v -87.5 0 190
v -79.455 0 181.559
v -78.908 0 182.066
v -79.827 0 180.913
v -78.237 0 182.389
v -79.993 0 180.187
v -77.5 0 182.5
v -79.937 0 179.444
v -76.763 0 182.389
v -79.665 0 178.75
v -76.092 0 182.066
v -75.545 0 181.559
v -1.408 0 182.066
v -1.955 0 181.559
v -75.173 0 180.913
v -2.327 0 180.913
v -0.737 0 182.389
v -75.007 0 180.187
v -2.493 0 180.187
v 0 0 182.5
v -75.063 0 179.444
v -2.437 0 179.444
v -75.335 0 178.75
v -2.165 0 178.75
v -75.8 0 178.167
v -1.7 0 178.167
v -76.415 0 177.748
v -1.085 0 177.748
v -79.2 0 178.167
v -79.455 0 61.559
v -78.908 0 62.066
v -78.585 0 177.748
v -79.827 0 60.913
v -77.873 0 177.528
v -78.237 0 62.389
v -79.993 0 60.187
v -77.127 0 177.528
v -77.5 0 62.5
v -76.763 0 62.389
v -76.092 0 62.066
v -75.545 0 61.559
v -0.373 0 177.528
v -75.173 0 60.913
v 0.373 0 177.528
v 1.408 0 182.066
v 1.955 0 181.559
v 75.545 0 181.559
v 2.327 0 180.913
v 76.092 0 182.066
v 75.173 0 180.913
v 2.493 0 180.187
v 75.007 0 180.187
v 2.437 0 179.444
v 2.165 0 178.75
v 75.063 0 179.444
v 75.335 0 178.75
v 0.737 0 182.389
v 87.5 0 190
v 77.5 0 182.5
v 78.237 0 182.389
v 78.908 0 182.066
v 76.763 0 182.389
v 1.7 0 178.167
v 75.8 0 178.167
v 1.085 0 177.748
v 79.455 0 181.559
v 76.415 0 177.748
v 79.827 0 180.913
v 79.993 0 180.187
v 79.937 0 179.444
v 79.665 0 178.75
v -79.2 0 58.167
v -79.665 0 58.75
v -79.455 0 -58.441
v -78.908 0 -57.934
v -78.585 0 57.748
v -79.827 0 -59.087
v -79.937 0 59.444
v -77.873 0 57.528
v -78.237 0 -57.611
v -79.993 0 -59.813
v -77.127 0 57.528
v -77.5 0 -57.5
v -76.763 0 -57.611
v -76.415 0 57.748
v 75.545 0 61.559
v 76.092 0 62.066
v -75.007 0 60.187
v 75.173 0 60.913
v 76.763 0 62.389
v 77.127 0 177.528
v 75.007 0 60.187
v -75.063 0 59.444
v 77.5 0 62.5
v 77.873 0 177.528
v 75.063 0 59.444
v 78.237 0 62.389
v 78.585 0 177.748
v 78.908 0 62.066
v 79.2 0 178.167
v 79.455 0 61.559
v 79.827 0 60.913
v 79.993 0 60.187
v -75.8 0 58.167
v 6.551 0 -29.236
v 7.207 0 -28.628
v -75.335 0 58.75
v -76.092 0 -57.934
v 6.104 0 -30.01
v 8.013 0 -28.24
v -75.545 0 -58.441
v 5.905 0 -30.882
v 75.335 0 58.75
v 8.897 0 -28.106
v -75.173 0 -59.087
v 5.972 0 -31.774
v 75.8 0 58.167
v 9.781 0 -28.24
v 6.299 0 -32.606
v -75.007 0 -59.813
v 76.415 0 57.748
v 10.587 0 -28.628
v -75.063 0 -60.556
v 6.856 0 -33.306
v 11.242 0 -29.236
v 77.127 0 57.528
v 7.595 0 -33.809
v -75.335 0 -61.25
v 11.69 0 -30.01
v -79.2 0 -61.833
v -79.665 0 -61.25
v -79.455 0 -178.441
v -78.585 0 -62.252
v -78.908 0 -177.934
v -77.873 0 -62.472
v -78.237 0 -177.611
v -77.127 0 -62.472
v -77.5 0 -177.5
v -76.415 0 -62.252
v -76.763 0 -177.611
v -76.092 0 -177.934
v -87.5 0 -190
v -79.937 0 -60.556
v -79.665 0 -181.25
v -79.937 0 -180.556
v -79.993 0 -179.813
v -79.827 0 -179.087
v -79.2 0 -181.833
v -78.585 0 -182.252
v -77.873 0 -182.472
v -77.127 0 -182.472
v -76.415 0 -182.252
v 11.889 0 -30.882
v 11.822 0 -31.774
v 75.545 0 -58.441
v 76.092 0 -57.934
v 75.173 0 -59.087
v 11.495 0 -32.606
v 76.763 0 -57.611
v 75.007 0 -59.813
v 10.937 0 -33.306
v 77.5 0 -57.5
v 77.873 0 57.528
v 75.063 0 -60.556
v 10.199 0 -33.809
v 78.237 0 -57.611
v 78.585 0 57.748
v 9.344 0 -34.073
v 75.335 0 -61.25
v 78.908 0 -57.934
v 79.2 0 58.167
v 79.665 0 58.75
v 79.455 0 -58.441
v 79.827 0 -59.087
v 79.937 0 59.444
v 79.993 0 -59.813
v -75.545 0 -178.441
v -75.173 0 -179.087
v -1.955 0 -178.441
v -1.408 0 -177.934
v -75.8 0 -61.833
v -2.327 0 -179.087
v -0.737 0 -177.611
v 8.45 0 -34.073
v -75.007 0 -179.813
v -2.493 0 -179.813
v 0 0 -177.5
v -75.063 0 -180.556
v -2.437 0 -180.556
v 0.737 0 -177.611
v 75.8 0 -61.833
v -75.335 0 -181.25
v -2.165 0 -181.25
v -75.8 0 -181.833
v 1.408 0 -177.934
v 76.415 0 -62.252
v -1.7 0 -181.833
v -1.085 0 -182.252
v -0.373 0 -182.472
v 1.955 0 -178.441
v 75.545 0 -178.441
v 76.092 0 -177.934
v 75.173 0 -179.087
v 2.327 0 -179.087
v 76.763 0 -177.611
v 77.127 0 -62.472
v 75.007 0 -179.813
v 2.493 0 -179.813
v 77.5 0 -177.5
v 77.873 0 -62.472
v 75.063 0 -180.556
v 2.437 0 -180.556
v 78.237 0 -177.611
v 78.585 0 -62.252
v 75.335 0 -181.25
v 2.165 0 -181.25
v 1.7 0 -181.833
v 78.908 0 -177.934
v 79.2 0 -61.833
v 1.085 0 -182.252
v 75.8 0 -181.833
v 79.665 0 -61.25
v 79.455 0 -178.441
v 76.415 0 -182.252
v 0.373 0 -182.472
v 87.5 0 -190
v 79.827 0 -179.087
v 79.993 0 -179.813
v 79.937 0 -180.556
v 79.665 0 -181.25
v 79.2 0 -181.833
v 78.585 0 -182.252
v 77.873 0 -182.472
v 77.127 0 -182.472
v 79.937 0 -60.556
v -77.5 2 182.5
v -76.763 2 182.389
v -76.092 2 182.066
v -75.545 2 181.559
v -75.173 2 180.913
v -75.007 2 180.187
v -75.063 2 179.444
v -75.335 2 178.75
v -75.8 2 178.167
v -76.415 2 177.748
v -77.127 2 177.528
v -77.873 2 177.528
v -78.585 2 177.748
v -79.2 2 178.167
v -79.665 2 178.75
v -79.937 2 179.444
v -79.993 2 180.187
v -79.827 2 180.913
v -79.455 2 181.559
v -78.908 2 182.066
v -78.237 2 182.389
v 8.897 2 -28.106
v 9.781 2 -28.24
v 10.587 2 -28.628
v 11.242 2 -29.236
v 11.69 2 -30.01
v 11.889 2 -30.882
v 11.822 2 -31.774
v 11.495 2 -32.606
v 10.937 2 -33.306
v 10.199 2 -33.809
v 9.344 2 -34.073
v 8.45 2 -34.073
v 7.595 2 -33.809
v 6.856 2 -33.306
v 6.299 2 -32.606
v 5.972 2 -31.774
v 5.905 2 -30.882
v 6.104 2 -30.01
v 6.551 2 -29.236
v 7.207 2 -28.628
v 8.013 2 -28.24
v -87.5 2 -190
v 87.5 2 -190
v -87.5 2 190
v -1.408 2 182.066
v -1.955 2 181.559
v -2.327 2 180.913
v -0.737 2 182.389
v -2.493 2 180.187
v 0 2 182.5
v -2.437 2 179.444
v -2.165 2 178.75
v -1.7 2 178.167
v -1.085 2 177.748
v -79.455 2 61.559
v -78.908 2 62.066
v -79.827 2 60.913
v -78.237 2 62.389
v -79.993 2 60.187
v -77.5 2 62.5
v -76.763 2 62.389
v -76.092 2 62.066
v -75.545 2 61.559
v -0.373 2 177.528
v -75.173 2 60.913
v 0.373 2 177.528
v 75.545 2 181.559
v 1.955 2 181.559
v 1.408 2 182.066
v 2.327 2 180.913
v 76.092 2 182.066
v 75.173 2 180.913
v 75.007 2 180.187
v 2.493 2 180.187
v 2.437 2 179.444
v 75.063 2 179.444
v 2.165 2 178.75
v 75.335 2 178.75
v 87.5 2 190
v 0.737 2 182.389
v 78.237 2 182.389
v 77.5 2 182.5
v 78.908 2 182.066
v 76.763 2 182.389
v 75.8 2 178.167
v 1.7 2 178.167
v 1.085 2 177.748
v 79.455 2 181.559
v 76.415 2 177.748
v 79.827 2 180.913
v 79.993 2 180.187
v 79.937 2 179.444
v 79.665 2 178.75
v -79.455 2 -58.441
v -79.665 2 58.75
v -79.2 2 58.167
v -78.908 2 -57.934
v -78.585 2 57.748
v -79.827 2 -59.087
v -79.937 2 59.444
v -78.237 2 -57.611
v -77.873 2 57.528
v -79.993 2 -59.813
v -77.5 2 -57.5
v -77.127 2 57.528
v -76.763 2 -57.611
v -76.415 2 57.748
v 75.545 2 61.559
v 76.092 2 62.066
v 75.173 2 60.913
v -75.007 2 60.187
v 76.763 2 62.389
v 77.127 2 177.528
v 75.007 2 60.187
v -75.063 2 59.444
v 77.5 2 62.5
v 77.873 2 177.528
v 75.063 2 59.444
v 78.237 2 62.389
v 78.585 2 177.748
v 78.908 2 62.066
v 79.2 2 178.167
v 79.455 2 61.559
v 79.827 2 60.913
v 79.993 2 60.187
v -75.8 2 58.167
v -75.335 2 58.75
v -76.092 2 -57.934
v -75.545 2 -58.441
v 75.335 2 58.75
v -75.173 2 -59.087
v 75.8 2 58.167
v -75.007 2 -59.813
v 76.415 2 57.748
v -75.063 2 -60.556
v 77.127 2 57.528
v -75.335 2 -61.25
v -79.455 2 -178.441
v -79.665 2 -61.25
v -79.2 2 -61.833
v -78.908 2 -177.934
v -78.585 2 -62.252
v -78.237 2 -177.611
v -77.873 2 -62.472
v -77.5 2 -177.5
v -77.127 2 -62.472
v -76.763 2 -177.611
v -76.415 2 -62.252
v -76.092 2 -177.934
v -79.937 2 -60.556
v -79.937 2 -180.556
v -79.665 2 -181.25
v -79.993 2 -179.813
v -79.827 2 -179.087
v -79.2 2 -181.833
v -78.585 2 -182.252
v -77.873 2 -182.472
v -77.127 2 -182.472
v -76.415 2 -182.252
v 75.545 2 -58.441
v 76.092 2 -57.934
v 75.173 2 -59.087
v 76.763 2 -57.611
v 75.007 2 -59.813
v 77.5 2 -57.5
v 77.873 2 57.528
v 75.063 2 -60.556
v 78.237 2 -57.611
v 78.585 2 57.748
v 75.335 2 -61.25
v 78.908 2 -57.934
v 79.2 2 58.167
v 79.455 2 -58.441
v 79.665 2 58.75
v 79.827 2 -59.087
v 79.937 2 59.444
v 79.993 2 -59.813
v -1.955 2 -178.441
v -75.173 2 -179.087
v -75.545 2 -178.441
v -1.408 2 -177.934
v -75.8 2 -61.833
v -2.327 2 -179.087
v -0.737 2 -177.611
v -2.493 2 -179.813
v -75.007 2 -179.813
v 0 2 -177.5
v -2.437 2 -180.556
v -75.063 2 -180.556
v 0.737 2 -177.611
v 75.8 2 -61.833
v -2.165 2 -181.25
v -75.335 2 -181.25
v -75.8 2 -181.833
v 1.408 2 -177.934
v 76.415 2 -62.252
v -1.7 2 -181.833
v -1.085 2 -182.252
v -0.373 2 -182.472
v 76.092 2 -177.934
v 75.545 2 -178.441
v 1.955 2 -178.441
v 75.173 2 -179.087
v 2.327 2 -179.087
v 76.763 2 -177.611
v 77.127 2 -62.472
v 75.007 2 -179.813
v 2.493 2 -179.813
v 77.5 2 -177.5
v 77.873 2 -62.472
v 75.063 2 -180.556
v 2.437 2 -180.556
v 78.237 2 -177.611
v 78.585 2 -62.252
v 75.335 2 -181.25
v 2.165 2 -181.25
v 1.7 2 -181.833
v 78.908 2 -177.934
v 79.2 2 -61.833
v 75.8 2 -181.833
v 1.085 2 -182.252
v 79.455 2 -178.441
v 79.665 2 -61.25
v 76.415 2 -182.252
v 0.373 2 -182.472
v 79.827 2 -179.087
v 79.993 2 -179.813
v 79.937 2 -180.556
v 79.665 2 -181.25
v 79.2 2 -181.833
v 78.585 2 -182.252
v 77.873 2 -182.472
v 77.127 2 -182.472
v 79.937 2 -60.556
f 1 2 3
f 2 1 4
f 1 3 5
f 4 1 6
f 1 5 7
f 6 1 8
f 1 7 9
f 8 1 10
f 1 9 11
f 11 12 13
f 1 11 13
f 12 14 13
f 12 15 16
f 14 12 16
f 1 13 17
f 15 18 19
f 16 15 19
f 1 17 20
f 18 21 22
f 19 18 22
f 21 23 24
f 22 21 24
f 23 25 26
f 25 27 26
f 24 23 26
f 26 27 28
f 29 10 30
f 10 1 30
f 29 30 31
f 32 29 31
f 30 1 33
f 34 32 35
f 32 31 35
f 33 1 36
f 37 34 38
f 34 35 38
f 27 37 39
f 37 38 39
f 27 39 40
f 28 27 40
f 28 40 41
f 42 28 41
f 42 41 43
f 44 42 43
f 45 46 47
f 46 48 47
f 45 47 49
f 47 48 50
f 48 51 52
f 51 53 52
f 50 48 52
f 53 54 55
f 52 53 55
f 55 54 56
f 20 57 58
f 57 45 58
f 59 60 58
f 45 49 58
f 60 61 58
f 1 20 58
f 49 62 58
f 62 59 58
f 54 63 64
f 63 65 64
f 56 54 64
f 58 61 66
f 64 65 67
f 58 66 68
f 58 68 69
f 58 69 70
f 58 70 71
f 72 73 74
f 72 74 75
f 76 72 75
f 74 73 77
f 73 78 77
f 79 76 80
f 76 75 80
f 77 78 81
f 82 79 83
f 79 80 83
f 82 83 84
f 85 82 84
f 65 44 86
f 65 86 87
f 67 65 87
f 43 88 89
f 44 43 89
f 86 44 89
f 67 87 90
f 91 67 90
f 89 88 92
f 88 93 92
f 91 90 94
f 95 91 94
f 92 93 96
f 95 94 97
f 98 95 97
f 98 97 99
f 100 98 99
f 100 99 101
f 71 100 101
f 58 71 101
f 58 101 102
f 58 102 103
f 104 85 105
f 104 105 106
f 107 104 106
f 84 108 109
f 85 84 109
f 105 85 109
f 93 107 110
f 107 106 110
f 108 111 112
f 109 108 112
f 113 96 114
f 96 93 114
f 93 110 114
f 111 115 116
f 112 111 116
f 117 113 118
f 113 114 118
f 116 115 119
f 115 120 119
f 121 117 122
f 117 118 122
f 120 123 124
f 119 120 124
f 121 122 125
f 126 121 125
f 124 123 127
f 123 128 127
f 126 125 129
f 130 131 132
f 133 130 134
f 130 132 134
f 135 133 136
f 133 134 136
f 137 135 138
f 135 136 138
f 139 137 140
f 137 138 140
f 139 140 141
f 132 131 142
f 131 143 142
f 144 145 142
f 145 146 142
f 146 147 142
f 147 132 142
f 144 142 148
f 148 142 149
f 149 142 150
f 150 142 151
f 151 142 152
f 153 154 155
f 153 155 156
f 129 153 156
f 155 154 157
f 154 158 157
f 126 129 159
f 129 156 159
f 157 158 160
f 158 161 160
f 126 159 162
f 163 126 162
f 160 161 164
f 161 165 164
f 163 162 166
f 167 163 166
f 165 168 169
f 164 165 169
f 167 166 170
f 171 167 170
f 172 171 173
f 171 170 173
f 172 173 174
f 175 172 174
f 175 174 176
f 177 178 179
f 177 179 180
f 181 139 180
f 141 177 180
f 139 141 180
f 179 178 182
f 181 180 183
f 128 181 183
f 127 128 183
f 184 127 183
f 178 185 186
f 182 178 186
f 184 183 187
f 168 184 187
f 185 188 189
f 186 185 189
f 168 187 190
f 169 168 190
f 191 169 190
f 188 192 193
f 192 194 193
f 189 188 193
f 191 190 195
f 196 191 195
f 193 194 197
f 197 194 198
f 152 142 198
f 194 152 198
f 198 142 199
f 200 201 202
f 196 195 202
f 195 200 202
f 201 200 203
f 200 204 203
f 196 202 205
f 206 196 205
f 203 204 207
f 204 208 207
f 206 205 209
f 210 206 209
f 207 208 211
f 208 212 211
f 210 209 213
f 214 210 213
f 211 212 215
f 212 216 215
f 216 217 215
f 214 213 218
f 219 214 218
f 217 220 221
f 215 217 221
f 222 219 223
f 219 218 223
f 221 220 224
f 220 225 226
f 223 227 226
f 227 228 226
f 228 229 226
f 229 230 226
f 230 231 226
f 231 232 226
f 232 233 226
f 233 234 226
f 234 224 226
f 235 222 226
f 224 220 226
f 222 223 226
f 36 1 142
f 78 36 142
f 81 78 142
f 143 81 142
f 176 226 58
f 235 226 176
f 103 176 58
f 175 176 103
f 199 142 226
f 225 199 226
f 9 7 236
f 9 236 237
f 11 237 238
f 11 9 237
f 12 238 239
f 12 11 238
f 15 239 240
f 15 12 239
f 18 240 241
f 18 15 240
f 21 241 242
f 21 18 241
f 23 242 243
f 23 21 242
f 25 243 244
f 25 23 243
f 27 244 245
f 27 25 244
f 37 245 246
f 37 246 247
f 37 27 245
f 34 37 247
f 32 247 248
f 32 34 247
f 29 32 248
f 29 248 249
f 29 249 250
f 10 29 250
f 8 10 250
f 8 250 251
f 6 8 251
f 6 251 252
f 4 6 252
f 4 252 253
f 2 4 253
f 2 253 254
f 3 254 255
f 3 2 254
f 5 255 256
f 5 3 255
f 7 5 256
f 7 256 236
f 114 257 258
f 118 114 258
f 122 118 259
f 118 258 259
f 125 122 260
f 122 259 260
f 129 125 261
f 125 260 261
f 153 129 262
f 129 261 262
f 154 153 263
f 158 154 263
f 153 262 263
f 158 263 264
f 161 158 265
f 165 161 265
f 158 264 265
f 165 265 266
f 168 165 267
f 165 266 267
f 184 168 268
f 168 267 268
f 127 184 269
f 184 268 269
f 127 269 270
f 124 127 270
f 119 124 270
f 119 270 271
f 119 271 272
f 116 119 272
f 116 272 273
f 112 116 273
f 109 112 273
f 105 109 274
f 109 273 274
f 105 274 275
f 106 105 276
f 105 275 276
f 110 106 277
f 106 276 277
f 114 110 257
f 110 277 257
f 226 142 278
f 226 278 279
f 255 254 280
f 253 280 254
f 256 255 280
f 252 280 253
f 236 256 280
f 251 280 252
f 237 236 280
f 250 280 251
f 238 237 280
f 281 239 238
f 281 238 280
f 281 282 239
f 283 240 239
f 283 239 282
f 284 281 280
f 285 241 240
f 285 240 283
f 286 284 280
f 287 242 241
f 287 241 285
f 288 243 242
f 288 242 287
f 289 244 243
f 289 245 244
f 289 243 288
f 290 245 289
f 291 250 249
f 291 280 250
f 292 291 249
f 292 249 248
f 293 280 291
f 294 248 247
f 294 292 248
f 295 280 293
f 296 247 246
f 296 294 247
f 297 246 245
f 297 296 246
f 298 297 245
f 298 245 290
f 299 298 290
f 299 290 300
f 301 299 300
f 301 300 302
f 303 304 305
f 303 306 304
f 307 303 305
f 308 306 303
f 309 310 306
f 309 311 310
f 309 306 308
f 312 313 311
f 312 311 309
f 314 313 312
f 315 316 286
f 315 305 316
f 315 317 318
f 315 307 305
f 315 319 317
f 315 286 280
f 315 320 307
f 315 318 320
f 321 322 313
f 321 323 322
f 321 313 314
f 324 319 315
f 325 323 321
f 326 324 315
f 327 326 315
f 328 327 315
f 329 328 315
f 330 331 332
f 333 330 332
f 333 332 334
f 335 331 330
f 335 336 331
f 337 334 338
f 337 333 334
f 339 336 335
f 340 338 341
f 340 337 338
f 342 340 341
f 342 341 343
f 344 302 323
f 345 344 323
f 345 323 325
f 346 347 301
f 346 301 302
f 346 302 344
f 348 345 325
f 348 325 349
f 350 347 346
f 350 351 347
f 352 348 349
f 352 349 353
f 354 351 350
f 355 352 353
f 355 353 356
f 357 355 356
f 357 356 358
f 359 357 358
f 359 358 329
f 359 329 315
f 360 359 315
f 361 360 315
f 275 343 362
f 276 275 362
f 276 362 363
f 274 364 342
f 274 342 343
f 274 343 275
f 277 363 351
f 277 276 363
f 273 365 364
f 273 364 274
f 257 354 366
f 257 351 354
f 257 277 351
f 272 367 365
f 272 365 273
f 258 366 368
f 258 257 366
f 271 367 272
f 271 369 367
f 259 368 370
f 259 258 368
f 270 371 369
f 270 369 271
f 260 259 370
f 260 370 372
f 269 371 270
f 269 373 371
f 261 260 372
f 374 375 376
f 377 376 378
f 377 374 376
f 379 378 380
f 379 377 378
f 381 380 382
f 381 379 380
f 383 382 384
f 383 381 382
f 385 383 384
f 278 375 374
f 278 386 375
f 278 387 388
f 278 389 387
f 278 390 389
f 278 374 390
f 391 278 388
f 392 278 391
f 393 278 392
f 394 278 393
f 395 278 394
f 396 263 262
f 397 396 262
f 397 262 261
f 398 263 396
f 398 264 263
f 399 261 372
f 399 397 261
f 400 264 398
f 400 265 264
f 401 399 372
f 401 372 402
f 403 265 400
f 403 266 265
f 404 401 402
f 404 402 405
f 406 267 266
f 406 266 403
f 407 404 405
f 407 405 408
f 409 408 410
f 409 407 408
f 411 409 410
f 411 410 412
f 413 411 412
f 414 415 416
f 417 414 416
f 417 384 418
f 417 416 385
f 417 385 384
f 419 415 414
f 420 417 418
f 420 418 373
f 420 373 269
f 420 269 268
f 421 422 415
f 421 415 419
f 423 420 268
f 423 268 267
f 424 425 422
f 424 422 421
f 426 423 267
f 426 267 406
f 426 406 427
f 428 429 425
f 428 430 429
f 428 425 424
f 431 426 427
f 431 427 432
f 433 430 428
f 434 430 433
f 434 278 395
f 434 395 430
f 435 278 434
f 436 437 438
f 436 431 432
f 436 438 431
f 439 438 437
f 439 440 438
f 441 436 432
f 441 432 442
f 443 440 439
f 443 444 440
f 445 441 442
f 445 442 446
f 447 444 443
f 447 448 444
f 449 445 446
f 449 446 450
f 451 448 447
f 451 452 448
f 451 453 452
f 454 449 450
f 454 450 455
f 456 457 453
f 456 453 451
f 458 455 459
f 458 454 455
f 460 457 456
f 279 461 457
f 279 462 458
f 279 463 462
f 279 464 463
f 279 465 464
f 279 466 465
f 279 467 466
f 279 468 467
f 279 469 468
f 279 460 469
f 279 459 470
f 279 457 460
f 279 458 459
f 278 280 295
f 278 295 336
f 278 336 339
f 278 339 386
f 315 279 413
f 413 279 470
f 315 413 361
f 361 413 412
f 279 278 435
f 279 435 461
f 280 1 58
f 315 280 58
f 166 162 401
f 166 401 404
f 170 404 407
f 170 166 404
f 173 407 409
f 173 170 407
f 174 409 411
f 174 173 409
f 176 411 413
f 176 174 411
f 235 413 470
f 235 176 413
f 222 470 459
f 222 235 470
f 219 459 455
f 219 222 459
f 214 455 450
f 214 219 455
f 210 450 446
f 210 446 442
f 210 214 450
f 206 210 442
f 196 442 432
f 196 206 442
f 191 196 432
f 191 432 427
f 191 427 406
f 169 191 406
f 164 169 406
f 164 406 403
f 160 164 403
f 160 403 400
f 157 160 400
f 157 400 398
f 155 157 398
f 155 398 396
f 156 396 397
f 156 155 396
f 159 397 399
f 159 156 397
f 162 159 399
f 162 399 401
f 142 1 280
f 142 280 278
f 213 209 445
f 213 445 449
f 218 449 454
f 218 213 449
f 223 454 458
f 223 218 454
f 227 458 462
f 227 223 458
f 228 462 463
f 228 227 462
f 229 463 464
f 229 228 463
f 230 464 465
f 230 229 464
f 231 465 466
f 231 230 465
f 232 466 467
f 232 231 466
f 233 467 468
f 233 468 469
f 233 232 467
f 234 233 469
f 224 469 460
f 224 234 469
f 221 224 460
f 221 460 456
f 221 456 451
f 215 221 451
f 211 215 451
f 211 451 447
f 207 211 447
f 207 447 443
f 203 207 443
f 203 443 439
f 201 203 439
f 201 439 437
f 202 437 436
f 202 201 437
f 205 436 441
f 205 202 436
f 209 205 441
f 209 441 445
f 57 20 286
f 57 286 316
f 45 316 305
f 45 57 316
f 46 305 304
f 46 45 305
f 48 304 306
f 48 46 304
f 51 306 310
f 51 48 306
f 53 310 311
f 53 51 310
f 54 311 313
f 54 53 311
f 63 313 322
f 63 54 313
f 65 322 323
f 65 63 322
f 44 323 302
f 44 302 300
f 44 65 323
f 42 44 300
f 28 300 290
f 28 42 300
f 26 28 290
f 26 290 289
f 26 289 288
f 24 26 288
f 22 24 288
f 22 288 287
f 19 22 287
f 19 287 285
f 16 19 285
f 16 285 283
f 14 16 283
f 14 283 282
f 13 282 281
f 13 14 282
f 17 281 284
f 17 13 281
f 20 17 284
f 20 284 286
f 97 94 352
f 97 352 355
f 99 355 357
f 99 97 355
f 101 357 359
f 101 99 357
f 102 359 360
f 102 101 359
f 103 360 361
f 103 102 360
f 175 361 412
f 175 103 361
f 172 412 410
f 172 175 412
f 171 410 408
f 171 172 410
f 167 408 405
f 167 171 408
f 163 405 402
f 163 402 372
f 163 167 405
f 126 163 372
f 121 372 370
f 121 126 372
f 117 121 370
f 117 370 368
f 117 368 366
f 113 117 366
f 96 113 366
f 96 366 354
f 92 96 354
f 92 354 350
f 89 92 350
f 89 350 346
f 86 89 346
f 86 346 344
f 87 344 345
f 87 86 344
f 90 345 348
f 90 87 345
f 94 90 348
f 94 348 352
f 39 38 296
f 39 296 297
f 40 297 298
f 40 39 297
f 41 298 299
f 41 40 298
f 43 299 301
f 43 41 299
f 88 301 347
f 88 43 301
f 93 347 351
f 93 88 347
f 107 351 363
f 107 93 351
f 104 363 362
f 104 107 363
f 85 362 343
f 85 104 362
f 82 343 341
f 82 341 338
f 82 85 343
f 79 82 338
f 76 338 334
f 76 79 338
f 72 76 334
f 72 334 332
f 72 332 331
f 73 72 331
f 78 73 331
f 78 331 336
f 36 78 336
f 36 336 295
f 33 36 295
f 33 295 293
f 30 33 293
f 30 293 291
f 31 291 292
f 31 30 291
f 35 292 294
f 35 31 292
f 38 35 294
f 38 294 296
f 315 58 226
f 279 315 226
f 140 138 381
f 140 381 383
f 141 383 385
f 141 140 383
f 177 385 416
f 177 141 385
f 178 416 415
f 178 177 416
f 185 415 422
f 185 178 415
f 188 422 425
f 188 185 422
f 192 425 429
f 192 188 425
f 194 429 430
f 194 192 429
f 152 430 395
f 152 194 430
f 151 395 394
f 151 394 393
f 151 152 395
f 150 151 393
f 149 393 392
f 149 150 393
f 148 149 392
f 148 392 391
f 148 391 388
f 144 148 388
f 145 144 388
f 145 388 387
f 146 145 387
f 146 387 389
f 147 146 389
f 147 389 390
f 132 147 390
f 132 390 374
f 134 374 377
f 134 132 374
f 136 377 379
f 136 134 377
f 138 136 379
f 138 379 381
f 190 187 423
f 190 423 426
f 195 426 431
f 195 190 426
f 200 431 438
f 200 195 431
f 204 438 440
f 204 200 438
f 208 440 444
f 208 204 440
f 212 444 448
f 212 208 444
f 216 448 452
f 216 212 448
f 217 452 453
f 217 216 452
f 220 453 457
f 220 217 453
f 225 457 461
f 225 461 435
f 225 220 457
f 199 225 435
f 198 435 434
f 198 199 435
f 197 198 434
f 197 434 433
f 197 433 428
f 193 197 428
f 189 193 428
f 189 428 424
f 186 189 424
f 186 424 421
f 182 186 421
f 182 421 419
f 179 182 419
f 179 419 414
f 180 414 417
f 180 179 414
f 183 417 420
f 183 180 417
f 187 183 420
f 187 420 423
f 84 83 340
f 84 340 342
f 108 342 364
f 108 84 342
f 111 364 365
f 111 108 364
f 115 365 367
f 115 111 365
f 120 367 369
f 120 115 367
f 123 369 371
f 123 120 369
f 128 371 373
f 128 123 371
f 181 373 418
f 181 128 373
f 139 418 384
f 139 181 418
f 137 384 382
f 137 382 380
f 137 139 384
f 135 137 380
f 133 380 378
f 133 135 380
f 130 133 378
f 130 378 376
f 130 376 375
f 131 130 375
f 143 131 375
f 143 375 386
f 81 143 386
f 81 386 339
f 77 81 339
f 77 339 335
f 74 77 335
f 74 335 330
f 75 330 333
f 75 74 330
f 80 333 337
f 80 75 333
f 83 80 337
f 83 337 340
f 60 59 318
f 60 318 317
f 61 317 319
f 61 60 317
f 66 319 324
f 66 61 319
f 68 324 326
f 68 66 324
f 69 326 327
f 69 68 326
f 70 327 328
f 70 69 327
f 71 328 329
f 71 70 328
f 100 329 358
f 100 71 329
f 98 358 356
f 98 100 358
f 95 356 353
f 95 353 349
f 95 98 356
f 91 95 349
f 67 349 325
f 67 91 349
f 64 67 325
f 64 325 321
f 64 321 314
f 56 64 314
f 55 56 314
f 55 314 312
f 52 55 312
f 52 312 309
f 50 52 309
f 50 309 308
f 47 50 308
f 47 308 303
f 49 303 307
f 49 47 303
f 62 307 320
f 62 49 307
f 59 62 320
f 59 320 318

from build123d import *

# Parameters (mm, degrees)
SKICA1_W                 = 175
SKICA1_H                 = 380
SKICA1_R                 = 2.5
P_IDAT_VYSUNUT_M1_DEPTH  = 2
SKICA2_R                 = 3
ODEBRAT_VYSUNUT_M1_DEPTH = 2


with BuildPart() as part:
    # Skica1 → Přidat vysunutím1 (new body)
    with BuildSketch(Plane(origin=(0, 0, 0), x_dir=(1, 0, 0), z_dir=(0, 1, 0))):
        Rectangle(SKICA1_W, SKICA1_H)
        with Locations(Location((-77.5, 180, 0), (0, 0, 270))):
            Circle(SKICA1_R, mode=Mode.SUBTRACT)
        with Locations(Location((0, 180, 0), (0, 0, 270))):
            Circle(SKICA1_R, mode=Mode.SUBTRACT)
        with Locations(Location((77.5, 180, 0), (0, 0, 270))):
            Circle(SKICA1_R, mode=Mode.SUBTRACT)
        with Locations(Location((77.5, 60, 0), (0, 0, 270))):
            Circle(SKICA1_R, mode=Mode.SUBTRACT)
        with Locations(Location((77.5, -60, 0), (0, 0, 270))):
            Circle(SKICA1_R, mode=Mode.SUBTRACT)
        with Locations(Location((0, -180, 0), (0, 0, 270))):
            Circle(SKICA1_R, mode=Mode.SUBTRACT)
        with Locations(Location((77.5, -180, 0), (0, 0, 270))):
            Circle(SKICA1_R, mode=Mode.SUBTRACT)
        with Locations(Location((-77.5, 60, 0), (0, 0, 270))):
            Circle(SKICA1_R, mode=Mode.SUBTRACT)
        with Locations(Location((-77.5, -60, 0), (0, 0, 270))):
            Circle(SKICA1_R, mode=Mode.SUBTRACT)
        with Locations(Location((-77.5, -180, 0), (0, 0, 270))):
            Circle(SKICA1_R, mode=Mode.SUBTRACT)
    extrude(amount=P_IDAT_VYSUNUT_M1_DEPTH)

    # Skica2 → Odebrat vysunutím1 (cut)
    with BuildSketch(Plane(origin=(0, 2, 0), x_dir=(1, 0, 0), z_dir=(0, 1, 0))):
        with Locations(Location((8.896944134, 31.106394631, 0), (0, 0, 270))):
            Circle(SKICA2_R)
    extrude(amount=-ODEBRAT_VYSUNUT_M1_DEPTH, mode=Mode.SUBTRACT)


solid = part.part
